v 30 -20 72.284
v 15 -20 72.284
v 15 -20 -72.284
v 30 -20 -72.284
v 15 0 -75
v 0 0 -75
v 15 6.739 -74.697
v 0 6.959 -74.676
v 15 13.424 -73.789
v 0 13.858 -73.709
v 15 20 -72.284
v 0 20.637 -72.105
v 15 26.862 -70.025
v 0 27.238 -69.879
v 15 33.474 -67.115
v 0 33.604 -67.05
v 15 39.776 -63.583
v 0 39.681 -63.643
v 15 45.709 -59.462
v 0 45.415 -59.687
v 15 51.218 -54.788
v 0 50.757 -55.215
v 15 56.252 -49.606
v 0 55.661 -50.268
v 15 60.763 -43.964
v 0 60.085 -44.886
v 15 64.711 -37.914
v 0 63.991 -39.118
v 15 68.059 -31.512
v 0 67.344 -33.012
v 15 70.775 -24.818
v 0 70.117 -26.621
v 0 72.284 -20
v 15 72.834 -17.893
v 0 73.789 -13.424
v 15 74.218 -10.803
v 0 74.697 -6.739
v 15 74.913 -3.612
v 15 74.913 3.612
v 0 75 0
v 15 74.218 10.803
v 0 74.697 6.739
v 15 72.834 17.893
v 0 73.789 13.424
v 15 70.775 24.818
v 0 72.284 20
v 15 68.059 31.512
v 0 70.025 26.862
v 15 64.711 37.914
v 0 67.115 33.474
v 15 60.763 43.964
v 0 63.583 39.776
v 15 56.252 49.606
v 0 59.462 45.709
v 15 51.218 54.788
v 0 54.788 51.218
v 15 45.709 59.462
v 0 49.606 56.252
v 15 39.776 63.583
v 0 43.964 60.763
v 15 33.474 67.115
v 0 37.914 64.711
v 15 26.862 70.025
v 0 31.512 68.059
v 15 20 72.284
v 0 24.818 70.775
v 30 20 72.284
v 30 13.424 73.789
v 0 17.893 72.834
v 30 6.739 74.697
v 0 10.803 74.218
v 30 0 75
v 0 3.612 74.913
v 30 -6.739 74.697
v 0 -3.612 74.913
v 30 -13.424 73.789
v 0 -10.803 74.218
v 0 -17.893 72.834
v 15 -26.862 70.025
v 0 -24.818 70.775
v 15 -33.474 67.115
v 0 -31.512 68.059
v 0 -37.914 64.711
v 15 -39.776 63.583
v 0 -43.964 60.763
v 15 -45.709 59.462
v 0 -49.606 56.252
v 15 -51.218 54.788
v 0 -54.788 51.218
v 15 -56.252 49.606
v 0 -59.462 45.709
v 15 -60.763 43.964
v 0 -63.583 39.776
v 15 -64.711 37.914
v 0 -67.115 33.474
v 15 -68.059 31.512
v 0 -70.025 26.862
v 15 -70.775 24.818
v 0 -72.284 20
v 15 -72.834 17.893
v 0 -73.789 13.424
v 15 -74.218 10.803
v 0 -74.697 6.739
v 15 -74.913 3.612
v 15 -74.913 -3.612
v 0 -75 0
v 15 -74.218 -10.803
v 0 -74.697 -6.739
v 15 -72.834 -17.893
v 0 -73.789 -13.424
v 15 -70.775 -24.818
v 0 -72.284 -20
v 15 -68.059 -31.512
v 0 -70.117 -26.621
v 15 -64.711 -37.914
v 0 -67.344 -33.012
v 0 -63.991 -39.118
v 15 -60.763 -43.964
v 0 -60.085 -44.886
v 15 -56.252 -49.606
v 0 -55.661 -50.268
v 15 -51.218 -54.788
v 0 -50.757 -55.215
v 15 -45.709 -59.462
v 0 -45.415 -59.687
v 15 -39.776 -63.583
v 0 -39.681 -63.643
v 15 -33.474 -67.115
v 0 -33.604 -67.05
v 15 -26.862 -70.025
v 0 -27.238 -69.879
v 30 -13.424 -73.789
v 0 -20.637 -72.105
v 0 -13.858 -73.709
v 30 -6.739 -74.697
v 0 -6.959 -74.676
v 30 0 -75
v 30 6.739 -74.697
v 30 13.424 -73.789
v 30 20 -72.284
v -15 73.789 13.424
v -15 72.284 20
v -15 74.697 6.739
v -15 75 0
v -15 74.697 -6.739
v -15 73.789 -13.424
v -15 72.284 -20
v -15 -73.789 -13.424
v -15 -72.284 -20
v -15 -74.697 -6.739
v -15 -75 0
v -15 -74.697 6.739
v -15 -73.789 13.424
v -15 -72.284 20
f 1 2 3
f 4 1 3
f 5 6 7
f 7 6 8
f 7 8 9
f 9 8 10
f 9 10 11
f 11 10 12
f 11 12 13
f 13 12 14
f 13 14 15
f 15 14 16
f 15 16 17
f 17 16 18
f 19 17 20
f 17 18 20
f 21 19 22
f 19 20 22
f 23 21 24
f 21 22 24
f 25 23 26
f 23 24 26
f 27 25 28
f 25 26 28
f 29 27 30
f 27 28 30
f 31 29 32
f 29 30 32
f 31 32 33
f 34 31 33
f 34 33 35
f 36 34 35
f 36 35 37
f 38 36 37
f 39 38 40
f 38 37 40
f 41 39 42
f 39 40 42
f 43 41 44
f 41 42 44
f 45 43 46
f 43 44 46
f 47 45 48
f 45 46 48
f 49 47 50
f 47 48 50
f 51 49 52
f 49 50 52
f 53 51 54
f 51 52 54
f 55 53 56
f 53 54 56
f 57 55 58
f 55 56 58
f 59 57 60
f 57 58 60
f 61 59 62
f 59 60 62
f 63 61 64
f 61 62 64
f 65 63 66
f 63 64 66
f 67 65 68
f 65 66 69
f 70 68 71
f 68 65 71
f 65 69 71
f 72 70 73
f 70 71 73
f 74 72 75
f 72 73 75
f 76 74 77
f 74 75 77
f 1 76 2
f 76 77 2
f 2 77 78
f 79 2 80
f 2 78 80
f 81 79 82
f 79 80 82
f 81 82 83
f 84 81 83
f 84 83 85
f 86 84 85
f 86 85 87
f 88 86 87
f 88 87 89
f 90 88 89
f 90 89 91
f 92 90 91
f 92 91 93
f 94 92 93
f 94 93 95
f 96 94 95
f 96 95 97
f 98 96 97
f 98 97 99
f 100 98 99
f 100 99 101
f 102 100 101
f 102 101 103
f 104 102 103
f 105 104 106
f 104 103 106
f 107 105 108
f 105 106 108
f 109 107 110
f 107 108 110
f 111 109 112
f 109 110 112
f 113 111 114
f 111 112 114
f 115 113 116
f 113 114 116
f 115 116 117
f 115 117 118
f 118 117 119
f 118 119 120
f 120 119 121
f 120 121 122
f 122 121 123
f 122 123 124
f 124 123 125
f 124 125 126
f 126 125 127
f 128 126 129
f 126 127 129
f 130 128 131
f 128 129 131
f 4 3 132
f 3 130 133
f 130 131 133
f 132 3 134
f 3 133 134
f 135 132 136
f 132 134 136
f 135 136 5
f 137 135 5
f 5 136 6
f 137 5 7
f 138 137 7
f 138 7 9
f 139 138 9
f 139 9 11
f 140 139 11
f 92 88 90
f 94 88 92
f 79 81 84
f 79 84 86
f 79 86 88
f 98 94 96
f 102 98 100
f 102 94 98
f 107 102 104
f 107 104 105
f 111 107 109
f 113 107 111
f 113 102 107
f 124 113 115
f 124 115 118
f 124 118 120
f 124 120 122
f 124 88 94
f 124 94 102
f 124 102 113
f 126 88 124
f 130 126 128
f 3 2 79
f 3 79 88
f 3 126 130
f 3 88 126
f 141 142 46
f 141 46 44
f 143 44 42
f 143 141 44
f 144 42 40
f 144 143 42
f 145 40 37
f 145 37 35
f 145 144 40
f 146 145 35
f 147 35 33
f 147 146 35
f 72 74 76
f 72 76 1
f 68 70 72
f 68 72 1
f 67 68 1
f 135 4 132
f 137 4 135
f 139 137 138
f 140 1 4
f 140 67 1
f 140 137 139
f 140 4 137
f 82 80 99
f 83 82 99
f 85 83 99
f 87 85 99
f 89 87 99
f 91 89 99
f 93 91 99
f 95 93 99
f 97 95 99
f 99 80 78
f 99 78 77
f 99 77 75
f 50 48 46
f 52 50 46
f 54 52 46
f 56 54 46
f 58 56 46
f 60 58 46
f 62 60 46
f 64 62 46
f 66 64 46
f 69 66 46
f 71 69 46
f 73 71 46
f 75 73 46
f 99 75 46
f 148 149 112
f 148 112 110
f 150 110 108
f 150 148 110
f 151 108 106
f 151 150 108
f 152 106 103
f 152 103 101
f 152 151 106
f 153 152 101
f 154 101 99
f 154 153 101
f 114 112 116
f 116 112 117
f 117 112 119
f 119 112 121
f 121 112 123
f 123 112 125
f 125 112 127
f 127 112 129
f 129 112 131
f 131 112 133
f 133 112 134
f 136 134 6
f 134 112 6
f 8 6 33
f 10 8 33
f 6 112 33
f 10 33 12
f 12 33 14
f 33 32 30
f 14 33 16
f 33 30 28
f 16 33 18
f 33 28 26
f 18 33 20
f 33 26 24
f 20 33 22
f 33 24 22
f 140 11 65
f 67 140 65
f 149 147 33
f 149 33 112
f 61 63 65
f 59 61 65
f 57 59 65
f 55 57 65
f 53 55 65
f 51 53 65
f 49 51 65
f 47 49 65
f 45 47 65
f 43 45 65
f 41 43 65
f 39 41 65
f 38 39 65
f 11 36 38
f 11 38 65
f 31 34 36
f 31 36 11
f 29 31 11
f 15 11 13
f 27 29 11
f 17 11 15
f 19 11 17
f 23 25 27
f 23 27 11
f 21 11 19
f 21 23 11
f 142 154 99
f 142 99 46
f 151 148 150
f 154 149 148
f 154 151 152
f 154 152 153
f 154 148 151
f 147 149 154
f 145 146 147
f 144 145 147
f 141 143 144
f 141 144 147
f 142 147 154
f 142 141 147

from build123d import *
from build123d.topology import SkipClean

# Parameters (mm, degrees)
SKETCH1_R           = 75
BOSS_EXTRUDE1_DEPTH = 15
BOSS_EXTRUDE2_DEPTH = 15
BOSS_EXTRUDE3_START = 15
BOSS_EXTRUDE3_DEPTH = 15


with BuildPart() as part:
    # Sketch1 → Boss-Extrude1 (new body)
    with BuildSketch(Plane(origin=(0, 0, 0), x_dir=(0, 0, -1), z_dir=(1, 0, 0))):
        Circle(SKETCH1_R)
    extrude(amount=BOSS_EXTRUDE1_DEPTH)

    # Sketch2 → Boss-Extrude2 (add)
    with BuildSketch(Plane(origin=(15, 0, 0), x_dir=(0, 0, -1), z_dir=(1, 0, 0))):
        with BuildLine():
            Line((-72.284161474, -20), (72.284161474, -20))
            ThreePointArc((72.284161474, -20), (75, 0), (72.284161474, 20))
            Line((72.284161474, 20), (-72.284161474, 20))
            ThreePointArc((-72.284161474, 20), (-75, 0), (-72.284161474, -20))
        make_face()
    extrude(amount=BOSS_EXTRUDE2_DEPTH)

    # Sketch3 → Boss-Extrude3 (add)
    with SkipClean():  # the faces are left unmerged after this step: merging them gives an invalid solid
        with BuildSketch(Plane.ZY.offset(BOSS_EXTRUDE3_START)):
            with BuildLine():
                Line((-20, 72.284161474), (-20, -72.284161474))
                ThreePointArc((-20, -72.284161474), (0, -75), (20, -72.284161474))
                Line((20, -72.284161474), (20, 72.284161474))
                ThreePointArc((20, 72.284161474), (0, 75), (-20, 72.284161474))
            make_face()
        extrude(amount=-BOSS_EXTRUDE3_DEPTH)


solid = part.part
